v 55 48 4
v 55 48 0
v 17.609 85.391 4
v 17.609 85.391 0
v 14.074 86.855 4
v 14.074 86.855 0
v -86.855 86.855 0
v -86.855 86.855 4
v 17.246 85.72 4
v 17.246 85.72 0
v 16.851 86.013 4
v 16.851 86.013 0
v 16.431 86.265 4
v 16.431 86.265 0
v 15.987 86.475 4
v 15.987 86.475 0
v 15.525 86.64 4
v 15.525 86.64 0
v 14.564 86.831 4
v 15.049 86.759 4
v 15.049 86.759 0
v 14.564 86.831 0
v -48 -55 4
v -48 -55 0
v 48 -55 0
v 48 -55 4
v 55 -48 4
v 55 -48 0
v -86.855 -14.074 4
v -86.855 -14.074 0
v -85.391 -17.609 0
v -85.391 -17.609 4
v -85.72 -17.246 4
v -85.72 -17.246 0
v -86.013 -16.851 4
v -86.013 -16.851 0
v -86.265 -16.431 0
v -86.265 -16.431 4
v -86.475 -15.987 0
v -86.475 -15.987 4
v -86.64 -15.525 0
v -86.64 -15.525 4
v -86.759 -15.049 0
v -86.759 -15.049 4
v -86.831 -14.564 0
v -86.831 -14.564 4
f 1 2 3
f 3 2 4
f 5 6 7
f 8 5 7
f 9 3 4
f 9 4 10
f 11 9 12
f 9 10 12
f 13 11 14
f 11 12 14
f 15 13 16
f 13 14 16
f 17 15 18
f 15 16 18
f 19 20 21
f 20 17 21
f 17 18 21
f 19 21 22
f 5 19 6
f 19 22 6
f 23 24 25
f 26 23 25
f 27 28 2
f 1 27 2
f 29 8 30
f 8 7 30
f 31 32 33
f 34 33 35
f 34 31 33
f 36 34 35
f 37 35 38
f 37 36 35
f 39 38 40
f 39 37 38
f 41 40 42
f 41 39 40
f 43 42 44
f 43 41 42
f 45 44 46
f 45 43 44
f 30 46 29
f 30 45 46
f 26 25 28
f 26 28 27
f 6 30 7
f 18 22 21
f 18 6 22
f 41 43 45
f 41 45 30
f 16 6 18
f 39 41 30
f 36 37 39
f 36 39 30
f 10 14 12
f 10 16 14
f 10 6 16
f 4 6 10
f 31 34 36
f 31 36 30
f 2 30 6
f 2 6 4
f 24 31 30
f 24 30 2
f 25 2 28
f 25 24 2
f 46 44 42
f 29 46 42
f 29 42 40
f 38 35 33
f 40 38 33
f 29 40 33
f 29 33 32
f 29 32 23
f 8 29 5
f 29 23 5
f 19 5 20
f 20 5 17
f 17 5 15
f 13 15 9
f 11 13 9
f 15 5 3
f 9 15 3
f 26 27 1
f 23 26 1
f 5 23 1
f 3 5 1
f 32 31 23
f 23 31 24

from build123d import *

# Parameters (mm, degrees)
F0_W      = 110
F0_H      = 110
F1_DEPTH  = 5
F3_DEPTH  = 100
F4_SIZE   = 7
F6_DEPTH  = 5
F8_DEPTH  = 100
F9_R      = 3
F10_R     = 3
F11_R     = 5
F12_R     = 40
F13_DEPTH = 2
F14_R     = 40
F15_DEPTH = 2
F17_DEPTH = 200


with BuildPart() as f1:
    # F0 (on Top) → F1 (new body)
    with BuildSketch(Plane.XY):
        Rectangle(F0_W, F0_H)
    extrude(amount=F1_DEPTH)

    # F2 (on face) → F3 (join)
    with BuildSketch(Plane.XY.offset(5)):
        Polygon((-55, -45), (-55, -55), (-45, -55), (-45, -50), (-50, -50), (-50, -45), align=None)
        Polygon((45, -50), (45, -55), (55, -55), (55, -45), (50, -45), (50, -50), align=None)
        Polygon((50, 45), (55, 45), (55, 55), (45, 55), (45, 50), (50, 50), align=None)
        Polygon((-55, 45), (-50, 45), (-50, 50), (-45, 50), (-45, 55), (-55, 55), align=None)
    extrude(amount=F3_DEPTH)

    # F4
    f4_edges = [f1.edges().sort_by_distance(p)[0] for p in [
        (55, -55, 52.5),
        (55, 55, 52.5),
        (-55, -55, 52.5),
        (-55, 55, 52.5),
    ]]
    chamfer(f4_edges, length=F4_SIZE)

    # F5 (on face) → F6 (join)
    with BuildSketch(Plane(origin=(0, 0, 0), x_dir=(1, 0, 0), z_dir=(0, 0, -1))):
        Polygon((-55, -48), (-55, 48), (-86.8553390593, 16.1446609407), (-86.8553390593, -86.8553390593), (16.1446609407, -86.8553390593), (48, -55), (-48, -55), align=None)
    extrude(amount=-F6_DEPTH)

    # F7 (on face) → F8 (join)
    with BuildSketch(Plane.XY.offset(5)):
        with BuildLine():
            Line((-86.8553390593, -16.1446609407), (-55, -48))
            Line((-55, -48), (-55, -45))
            add(Edge.make_bspline(
                [(-55, -45), (-61.680716385, -38.545717713), (-73.8128115293, -26.9133031572), (-84.5587400556, -12.5278182858), (-85.5100929907, -5.3594725865), (-85.6892368288, -2.2746161558)],
                knots=[0, 0, 0, 0, 0.4166944434, 0.7503780711, 1, 1, 1, 1], degree=3))
            Line((-85.6892368288, -2.2746161558), (-85.6892368288, 84.628576657))
            Line((-85.6892368288, 84.628576657), (-52.0303300859, 50.9696699141))
            Line((-52.0303300859, 50.9696699141), (-50.9696699141, 52.0303300859))
            Line((-50.9696699141, 52.0303300859), (-84.628576657, 85.6892368288))
            Line((-84.628576657, 85.6892368288), (2.2746161558, 85.6892368288))
            add(Edge.make_bspline(
                [(45, 55), (38.545717713, 61.680716385), (26.9133031572, 73.8128115293), (12.5278182858, 84.5587400556), (5.3594725865, 85.5100929907), (2.2746161558, 85.6892368288)],
                knots=[0, 0, 0, 0, 0.4166944434, 0.7503780711, 1, 1, 1, 1], degree=3))
            Line((45, 55), (48, 55))
            Line((48, 55), (16.1446609407, 86.8553390593))
            Line((16.1446609407, 86.8553390593), (-86.8553390593, 86.8553390593))
            Line((-86.8553390593, 86.8553390593), (-86.8553390593, -16.1446609407))
        make_face()
    extrude(amount=F8_DEPTH)

    # F9
    f9_edges = [f1.edges().sort_by_distance(p)[0] for p in [
        (-50.96967, 52.03033, 55),
        (-52.03033, 50.96967, 55),
    ]]
    fillet(f9_edges, radius=F9_R)

    # F10
    f10_edges = [f1.edges().sort_by_distance(p)[0] for p in [
        (45, 55, 55),
        (-55, -45, 55),
        (-85.689237, 84.628577, 55),
        (-84.628577, 85.689237, 55),
    ]]
    fillet(f10_edges, radius=F10_R)

    # F11
    f11_edges = [f1.edges().sort_by_distance(p)[0] for p in [
        (-86.855339, -16.144661, 52.5),
        (16.144661, 86.855339, 52.5),
    ]]
    fillet(f11_edges, radius=F11_R)

    # F12 (on face) → F13 (cut)
    with BuildSketch(Plane(origin=(0, 86.8553390593, 0), x_dir=(-1, 0, 0), z_dir=(0, 1, 0))):
        with Locations((36.3908729653, 52.5)):
            Circle(F12_R)
    extrude(amount=-F13_DEPTH, mode=Mode.SUBTRACT)

    # F14 (on face) → F15 (cut)
    with BuildSketch(Plane(origin=(-86.8553390593, 0, 0), x_dir=(0, -1, 0), z_dir=(-1, 0, 0))):
        with Locations((-36.3908729653, 52.5)):
            Circle(F14_R)
    extrude(amount=-F15_DEPTH, mode=Mode.SUBTRACT)

    # F16 (on face) → F17 (cut)
    with BuildSketch(Plane(origin=(51.5, -51.5, 0), x_dir=(0.7071067812, 0.7071067812, 0), z_dir=(0.7071067812, -0.7071067812, 0))):
        Polygon((0, 105), (-74.4917392731, 105), (-74.4917392731, 4), (75.3377377987, 4), (75.3377377987, 105), (4.9497474683, 105), align=None)
    extrude(amount=-F17_DEPTH, mode=Mode.SUBTRACT)


solid = f1.part
